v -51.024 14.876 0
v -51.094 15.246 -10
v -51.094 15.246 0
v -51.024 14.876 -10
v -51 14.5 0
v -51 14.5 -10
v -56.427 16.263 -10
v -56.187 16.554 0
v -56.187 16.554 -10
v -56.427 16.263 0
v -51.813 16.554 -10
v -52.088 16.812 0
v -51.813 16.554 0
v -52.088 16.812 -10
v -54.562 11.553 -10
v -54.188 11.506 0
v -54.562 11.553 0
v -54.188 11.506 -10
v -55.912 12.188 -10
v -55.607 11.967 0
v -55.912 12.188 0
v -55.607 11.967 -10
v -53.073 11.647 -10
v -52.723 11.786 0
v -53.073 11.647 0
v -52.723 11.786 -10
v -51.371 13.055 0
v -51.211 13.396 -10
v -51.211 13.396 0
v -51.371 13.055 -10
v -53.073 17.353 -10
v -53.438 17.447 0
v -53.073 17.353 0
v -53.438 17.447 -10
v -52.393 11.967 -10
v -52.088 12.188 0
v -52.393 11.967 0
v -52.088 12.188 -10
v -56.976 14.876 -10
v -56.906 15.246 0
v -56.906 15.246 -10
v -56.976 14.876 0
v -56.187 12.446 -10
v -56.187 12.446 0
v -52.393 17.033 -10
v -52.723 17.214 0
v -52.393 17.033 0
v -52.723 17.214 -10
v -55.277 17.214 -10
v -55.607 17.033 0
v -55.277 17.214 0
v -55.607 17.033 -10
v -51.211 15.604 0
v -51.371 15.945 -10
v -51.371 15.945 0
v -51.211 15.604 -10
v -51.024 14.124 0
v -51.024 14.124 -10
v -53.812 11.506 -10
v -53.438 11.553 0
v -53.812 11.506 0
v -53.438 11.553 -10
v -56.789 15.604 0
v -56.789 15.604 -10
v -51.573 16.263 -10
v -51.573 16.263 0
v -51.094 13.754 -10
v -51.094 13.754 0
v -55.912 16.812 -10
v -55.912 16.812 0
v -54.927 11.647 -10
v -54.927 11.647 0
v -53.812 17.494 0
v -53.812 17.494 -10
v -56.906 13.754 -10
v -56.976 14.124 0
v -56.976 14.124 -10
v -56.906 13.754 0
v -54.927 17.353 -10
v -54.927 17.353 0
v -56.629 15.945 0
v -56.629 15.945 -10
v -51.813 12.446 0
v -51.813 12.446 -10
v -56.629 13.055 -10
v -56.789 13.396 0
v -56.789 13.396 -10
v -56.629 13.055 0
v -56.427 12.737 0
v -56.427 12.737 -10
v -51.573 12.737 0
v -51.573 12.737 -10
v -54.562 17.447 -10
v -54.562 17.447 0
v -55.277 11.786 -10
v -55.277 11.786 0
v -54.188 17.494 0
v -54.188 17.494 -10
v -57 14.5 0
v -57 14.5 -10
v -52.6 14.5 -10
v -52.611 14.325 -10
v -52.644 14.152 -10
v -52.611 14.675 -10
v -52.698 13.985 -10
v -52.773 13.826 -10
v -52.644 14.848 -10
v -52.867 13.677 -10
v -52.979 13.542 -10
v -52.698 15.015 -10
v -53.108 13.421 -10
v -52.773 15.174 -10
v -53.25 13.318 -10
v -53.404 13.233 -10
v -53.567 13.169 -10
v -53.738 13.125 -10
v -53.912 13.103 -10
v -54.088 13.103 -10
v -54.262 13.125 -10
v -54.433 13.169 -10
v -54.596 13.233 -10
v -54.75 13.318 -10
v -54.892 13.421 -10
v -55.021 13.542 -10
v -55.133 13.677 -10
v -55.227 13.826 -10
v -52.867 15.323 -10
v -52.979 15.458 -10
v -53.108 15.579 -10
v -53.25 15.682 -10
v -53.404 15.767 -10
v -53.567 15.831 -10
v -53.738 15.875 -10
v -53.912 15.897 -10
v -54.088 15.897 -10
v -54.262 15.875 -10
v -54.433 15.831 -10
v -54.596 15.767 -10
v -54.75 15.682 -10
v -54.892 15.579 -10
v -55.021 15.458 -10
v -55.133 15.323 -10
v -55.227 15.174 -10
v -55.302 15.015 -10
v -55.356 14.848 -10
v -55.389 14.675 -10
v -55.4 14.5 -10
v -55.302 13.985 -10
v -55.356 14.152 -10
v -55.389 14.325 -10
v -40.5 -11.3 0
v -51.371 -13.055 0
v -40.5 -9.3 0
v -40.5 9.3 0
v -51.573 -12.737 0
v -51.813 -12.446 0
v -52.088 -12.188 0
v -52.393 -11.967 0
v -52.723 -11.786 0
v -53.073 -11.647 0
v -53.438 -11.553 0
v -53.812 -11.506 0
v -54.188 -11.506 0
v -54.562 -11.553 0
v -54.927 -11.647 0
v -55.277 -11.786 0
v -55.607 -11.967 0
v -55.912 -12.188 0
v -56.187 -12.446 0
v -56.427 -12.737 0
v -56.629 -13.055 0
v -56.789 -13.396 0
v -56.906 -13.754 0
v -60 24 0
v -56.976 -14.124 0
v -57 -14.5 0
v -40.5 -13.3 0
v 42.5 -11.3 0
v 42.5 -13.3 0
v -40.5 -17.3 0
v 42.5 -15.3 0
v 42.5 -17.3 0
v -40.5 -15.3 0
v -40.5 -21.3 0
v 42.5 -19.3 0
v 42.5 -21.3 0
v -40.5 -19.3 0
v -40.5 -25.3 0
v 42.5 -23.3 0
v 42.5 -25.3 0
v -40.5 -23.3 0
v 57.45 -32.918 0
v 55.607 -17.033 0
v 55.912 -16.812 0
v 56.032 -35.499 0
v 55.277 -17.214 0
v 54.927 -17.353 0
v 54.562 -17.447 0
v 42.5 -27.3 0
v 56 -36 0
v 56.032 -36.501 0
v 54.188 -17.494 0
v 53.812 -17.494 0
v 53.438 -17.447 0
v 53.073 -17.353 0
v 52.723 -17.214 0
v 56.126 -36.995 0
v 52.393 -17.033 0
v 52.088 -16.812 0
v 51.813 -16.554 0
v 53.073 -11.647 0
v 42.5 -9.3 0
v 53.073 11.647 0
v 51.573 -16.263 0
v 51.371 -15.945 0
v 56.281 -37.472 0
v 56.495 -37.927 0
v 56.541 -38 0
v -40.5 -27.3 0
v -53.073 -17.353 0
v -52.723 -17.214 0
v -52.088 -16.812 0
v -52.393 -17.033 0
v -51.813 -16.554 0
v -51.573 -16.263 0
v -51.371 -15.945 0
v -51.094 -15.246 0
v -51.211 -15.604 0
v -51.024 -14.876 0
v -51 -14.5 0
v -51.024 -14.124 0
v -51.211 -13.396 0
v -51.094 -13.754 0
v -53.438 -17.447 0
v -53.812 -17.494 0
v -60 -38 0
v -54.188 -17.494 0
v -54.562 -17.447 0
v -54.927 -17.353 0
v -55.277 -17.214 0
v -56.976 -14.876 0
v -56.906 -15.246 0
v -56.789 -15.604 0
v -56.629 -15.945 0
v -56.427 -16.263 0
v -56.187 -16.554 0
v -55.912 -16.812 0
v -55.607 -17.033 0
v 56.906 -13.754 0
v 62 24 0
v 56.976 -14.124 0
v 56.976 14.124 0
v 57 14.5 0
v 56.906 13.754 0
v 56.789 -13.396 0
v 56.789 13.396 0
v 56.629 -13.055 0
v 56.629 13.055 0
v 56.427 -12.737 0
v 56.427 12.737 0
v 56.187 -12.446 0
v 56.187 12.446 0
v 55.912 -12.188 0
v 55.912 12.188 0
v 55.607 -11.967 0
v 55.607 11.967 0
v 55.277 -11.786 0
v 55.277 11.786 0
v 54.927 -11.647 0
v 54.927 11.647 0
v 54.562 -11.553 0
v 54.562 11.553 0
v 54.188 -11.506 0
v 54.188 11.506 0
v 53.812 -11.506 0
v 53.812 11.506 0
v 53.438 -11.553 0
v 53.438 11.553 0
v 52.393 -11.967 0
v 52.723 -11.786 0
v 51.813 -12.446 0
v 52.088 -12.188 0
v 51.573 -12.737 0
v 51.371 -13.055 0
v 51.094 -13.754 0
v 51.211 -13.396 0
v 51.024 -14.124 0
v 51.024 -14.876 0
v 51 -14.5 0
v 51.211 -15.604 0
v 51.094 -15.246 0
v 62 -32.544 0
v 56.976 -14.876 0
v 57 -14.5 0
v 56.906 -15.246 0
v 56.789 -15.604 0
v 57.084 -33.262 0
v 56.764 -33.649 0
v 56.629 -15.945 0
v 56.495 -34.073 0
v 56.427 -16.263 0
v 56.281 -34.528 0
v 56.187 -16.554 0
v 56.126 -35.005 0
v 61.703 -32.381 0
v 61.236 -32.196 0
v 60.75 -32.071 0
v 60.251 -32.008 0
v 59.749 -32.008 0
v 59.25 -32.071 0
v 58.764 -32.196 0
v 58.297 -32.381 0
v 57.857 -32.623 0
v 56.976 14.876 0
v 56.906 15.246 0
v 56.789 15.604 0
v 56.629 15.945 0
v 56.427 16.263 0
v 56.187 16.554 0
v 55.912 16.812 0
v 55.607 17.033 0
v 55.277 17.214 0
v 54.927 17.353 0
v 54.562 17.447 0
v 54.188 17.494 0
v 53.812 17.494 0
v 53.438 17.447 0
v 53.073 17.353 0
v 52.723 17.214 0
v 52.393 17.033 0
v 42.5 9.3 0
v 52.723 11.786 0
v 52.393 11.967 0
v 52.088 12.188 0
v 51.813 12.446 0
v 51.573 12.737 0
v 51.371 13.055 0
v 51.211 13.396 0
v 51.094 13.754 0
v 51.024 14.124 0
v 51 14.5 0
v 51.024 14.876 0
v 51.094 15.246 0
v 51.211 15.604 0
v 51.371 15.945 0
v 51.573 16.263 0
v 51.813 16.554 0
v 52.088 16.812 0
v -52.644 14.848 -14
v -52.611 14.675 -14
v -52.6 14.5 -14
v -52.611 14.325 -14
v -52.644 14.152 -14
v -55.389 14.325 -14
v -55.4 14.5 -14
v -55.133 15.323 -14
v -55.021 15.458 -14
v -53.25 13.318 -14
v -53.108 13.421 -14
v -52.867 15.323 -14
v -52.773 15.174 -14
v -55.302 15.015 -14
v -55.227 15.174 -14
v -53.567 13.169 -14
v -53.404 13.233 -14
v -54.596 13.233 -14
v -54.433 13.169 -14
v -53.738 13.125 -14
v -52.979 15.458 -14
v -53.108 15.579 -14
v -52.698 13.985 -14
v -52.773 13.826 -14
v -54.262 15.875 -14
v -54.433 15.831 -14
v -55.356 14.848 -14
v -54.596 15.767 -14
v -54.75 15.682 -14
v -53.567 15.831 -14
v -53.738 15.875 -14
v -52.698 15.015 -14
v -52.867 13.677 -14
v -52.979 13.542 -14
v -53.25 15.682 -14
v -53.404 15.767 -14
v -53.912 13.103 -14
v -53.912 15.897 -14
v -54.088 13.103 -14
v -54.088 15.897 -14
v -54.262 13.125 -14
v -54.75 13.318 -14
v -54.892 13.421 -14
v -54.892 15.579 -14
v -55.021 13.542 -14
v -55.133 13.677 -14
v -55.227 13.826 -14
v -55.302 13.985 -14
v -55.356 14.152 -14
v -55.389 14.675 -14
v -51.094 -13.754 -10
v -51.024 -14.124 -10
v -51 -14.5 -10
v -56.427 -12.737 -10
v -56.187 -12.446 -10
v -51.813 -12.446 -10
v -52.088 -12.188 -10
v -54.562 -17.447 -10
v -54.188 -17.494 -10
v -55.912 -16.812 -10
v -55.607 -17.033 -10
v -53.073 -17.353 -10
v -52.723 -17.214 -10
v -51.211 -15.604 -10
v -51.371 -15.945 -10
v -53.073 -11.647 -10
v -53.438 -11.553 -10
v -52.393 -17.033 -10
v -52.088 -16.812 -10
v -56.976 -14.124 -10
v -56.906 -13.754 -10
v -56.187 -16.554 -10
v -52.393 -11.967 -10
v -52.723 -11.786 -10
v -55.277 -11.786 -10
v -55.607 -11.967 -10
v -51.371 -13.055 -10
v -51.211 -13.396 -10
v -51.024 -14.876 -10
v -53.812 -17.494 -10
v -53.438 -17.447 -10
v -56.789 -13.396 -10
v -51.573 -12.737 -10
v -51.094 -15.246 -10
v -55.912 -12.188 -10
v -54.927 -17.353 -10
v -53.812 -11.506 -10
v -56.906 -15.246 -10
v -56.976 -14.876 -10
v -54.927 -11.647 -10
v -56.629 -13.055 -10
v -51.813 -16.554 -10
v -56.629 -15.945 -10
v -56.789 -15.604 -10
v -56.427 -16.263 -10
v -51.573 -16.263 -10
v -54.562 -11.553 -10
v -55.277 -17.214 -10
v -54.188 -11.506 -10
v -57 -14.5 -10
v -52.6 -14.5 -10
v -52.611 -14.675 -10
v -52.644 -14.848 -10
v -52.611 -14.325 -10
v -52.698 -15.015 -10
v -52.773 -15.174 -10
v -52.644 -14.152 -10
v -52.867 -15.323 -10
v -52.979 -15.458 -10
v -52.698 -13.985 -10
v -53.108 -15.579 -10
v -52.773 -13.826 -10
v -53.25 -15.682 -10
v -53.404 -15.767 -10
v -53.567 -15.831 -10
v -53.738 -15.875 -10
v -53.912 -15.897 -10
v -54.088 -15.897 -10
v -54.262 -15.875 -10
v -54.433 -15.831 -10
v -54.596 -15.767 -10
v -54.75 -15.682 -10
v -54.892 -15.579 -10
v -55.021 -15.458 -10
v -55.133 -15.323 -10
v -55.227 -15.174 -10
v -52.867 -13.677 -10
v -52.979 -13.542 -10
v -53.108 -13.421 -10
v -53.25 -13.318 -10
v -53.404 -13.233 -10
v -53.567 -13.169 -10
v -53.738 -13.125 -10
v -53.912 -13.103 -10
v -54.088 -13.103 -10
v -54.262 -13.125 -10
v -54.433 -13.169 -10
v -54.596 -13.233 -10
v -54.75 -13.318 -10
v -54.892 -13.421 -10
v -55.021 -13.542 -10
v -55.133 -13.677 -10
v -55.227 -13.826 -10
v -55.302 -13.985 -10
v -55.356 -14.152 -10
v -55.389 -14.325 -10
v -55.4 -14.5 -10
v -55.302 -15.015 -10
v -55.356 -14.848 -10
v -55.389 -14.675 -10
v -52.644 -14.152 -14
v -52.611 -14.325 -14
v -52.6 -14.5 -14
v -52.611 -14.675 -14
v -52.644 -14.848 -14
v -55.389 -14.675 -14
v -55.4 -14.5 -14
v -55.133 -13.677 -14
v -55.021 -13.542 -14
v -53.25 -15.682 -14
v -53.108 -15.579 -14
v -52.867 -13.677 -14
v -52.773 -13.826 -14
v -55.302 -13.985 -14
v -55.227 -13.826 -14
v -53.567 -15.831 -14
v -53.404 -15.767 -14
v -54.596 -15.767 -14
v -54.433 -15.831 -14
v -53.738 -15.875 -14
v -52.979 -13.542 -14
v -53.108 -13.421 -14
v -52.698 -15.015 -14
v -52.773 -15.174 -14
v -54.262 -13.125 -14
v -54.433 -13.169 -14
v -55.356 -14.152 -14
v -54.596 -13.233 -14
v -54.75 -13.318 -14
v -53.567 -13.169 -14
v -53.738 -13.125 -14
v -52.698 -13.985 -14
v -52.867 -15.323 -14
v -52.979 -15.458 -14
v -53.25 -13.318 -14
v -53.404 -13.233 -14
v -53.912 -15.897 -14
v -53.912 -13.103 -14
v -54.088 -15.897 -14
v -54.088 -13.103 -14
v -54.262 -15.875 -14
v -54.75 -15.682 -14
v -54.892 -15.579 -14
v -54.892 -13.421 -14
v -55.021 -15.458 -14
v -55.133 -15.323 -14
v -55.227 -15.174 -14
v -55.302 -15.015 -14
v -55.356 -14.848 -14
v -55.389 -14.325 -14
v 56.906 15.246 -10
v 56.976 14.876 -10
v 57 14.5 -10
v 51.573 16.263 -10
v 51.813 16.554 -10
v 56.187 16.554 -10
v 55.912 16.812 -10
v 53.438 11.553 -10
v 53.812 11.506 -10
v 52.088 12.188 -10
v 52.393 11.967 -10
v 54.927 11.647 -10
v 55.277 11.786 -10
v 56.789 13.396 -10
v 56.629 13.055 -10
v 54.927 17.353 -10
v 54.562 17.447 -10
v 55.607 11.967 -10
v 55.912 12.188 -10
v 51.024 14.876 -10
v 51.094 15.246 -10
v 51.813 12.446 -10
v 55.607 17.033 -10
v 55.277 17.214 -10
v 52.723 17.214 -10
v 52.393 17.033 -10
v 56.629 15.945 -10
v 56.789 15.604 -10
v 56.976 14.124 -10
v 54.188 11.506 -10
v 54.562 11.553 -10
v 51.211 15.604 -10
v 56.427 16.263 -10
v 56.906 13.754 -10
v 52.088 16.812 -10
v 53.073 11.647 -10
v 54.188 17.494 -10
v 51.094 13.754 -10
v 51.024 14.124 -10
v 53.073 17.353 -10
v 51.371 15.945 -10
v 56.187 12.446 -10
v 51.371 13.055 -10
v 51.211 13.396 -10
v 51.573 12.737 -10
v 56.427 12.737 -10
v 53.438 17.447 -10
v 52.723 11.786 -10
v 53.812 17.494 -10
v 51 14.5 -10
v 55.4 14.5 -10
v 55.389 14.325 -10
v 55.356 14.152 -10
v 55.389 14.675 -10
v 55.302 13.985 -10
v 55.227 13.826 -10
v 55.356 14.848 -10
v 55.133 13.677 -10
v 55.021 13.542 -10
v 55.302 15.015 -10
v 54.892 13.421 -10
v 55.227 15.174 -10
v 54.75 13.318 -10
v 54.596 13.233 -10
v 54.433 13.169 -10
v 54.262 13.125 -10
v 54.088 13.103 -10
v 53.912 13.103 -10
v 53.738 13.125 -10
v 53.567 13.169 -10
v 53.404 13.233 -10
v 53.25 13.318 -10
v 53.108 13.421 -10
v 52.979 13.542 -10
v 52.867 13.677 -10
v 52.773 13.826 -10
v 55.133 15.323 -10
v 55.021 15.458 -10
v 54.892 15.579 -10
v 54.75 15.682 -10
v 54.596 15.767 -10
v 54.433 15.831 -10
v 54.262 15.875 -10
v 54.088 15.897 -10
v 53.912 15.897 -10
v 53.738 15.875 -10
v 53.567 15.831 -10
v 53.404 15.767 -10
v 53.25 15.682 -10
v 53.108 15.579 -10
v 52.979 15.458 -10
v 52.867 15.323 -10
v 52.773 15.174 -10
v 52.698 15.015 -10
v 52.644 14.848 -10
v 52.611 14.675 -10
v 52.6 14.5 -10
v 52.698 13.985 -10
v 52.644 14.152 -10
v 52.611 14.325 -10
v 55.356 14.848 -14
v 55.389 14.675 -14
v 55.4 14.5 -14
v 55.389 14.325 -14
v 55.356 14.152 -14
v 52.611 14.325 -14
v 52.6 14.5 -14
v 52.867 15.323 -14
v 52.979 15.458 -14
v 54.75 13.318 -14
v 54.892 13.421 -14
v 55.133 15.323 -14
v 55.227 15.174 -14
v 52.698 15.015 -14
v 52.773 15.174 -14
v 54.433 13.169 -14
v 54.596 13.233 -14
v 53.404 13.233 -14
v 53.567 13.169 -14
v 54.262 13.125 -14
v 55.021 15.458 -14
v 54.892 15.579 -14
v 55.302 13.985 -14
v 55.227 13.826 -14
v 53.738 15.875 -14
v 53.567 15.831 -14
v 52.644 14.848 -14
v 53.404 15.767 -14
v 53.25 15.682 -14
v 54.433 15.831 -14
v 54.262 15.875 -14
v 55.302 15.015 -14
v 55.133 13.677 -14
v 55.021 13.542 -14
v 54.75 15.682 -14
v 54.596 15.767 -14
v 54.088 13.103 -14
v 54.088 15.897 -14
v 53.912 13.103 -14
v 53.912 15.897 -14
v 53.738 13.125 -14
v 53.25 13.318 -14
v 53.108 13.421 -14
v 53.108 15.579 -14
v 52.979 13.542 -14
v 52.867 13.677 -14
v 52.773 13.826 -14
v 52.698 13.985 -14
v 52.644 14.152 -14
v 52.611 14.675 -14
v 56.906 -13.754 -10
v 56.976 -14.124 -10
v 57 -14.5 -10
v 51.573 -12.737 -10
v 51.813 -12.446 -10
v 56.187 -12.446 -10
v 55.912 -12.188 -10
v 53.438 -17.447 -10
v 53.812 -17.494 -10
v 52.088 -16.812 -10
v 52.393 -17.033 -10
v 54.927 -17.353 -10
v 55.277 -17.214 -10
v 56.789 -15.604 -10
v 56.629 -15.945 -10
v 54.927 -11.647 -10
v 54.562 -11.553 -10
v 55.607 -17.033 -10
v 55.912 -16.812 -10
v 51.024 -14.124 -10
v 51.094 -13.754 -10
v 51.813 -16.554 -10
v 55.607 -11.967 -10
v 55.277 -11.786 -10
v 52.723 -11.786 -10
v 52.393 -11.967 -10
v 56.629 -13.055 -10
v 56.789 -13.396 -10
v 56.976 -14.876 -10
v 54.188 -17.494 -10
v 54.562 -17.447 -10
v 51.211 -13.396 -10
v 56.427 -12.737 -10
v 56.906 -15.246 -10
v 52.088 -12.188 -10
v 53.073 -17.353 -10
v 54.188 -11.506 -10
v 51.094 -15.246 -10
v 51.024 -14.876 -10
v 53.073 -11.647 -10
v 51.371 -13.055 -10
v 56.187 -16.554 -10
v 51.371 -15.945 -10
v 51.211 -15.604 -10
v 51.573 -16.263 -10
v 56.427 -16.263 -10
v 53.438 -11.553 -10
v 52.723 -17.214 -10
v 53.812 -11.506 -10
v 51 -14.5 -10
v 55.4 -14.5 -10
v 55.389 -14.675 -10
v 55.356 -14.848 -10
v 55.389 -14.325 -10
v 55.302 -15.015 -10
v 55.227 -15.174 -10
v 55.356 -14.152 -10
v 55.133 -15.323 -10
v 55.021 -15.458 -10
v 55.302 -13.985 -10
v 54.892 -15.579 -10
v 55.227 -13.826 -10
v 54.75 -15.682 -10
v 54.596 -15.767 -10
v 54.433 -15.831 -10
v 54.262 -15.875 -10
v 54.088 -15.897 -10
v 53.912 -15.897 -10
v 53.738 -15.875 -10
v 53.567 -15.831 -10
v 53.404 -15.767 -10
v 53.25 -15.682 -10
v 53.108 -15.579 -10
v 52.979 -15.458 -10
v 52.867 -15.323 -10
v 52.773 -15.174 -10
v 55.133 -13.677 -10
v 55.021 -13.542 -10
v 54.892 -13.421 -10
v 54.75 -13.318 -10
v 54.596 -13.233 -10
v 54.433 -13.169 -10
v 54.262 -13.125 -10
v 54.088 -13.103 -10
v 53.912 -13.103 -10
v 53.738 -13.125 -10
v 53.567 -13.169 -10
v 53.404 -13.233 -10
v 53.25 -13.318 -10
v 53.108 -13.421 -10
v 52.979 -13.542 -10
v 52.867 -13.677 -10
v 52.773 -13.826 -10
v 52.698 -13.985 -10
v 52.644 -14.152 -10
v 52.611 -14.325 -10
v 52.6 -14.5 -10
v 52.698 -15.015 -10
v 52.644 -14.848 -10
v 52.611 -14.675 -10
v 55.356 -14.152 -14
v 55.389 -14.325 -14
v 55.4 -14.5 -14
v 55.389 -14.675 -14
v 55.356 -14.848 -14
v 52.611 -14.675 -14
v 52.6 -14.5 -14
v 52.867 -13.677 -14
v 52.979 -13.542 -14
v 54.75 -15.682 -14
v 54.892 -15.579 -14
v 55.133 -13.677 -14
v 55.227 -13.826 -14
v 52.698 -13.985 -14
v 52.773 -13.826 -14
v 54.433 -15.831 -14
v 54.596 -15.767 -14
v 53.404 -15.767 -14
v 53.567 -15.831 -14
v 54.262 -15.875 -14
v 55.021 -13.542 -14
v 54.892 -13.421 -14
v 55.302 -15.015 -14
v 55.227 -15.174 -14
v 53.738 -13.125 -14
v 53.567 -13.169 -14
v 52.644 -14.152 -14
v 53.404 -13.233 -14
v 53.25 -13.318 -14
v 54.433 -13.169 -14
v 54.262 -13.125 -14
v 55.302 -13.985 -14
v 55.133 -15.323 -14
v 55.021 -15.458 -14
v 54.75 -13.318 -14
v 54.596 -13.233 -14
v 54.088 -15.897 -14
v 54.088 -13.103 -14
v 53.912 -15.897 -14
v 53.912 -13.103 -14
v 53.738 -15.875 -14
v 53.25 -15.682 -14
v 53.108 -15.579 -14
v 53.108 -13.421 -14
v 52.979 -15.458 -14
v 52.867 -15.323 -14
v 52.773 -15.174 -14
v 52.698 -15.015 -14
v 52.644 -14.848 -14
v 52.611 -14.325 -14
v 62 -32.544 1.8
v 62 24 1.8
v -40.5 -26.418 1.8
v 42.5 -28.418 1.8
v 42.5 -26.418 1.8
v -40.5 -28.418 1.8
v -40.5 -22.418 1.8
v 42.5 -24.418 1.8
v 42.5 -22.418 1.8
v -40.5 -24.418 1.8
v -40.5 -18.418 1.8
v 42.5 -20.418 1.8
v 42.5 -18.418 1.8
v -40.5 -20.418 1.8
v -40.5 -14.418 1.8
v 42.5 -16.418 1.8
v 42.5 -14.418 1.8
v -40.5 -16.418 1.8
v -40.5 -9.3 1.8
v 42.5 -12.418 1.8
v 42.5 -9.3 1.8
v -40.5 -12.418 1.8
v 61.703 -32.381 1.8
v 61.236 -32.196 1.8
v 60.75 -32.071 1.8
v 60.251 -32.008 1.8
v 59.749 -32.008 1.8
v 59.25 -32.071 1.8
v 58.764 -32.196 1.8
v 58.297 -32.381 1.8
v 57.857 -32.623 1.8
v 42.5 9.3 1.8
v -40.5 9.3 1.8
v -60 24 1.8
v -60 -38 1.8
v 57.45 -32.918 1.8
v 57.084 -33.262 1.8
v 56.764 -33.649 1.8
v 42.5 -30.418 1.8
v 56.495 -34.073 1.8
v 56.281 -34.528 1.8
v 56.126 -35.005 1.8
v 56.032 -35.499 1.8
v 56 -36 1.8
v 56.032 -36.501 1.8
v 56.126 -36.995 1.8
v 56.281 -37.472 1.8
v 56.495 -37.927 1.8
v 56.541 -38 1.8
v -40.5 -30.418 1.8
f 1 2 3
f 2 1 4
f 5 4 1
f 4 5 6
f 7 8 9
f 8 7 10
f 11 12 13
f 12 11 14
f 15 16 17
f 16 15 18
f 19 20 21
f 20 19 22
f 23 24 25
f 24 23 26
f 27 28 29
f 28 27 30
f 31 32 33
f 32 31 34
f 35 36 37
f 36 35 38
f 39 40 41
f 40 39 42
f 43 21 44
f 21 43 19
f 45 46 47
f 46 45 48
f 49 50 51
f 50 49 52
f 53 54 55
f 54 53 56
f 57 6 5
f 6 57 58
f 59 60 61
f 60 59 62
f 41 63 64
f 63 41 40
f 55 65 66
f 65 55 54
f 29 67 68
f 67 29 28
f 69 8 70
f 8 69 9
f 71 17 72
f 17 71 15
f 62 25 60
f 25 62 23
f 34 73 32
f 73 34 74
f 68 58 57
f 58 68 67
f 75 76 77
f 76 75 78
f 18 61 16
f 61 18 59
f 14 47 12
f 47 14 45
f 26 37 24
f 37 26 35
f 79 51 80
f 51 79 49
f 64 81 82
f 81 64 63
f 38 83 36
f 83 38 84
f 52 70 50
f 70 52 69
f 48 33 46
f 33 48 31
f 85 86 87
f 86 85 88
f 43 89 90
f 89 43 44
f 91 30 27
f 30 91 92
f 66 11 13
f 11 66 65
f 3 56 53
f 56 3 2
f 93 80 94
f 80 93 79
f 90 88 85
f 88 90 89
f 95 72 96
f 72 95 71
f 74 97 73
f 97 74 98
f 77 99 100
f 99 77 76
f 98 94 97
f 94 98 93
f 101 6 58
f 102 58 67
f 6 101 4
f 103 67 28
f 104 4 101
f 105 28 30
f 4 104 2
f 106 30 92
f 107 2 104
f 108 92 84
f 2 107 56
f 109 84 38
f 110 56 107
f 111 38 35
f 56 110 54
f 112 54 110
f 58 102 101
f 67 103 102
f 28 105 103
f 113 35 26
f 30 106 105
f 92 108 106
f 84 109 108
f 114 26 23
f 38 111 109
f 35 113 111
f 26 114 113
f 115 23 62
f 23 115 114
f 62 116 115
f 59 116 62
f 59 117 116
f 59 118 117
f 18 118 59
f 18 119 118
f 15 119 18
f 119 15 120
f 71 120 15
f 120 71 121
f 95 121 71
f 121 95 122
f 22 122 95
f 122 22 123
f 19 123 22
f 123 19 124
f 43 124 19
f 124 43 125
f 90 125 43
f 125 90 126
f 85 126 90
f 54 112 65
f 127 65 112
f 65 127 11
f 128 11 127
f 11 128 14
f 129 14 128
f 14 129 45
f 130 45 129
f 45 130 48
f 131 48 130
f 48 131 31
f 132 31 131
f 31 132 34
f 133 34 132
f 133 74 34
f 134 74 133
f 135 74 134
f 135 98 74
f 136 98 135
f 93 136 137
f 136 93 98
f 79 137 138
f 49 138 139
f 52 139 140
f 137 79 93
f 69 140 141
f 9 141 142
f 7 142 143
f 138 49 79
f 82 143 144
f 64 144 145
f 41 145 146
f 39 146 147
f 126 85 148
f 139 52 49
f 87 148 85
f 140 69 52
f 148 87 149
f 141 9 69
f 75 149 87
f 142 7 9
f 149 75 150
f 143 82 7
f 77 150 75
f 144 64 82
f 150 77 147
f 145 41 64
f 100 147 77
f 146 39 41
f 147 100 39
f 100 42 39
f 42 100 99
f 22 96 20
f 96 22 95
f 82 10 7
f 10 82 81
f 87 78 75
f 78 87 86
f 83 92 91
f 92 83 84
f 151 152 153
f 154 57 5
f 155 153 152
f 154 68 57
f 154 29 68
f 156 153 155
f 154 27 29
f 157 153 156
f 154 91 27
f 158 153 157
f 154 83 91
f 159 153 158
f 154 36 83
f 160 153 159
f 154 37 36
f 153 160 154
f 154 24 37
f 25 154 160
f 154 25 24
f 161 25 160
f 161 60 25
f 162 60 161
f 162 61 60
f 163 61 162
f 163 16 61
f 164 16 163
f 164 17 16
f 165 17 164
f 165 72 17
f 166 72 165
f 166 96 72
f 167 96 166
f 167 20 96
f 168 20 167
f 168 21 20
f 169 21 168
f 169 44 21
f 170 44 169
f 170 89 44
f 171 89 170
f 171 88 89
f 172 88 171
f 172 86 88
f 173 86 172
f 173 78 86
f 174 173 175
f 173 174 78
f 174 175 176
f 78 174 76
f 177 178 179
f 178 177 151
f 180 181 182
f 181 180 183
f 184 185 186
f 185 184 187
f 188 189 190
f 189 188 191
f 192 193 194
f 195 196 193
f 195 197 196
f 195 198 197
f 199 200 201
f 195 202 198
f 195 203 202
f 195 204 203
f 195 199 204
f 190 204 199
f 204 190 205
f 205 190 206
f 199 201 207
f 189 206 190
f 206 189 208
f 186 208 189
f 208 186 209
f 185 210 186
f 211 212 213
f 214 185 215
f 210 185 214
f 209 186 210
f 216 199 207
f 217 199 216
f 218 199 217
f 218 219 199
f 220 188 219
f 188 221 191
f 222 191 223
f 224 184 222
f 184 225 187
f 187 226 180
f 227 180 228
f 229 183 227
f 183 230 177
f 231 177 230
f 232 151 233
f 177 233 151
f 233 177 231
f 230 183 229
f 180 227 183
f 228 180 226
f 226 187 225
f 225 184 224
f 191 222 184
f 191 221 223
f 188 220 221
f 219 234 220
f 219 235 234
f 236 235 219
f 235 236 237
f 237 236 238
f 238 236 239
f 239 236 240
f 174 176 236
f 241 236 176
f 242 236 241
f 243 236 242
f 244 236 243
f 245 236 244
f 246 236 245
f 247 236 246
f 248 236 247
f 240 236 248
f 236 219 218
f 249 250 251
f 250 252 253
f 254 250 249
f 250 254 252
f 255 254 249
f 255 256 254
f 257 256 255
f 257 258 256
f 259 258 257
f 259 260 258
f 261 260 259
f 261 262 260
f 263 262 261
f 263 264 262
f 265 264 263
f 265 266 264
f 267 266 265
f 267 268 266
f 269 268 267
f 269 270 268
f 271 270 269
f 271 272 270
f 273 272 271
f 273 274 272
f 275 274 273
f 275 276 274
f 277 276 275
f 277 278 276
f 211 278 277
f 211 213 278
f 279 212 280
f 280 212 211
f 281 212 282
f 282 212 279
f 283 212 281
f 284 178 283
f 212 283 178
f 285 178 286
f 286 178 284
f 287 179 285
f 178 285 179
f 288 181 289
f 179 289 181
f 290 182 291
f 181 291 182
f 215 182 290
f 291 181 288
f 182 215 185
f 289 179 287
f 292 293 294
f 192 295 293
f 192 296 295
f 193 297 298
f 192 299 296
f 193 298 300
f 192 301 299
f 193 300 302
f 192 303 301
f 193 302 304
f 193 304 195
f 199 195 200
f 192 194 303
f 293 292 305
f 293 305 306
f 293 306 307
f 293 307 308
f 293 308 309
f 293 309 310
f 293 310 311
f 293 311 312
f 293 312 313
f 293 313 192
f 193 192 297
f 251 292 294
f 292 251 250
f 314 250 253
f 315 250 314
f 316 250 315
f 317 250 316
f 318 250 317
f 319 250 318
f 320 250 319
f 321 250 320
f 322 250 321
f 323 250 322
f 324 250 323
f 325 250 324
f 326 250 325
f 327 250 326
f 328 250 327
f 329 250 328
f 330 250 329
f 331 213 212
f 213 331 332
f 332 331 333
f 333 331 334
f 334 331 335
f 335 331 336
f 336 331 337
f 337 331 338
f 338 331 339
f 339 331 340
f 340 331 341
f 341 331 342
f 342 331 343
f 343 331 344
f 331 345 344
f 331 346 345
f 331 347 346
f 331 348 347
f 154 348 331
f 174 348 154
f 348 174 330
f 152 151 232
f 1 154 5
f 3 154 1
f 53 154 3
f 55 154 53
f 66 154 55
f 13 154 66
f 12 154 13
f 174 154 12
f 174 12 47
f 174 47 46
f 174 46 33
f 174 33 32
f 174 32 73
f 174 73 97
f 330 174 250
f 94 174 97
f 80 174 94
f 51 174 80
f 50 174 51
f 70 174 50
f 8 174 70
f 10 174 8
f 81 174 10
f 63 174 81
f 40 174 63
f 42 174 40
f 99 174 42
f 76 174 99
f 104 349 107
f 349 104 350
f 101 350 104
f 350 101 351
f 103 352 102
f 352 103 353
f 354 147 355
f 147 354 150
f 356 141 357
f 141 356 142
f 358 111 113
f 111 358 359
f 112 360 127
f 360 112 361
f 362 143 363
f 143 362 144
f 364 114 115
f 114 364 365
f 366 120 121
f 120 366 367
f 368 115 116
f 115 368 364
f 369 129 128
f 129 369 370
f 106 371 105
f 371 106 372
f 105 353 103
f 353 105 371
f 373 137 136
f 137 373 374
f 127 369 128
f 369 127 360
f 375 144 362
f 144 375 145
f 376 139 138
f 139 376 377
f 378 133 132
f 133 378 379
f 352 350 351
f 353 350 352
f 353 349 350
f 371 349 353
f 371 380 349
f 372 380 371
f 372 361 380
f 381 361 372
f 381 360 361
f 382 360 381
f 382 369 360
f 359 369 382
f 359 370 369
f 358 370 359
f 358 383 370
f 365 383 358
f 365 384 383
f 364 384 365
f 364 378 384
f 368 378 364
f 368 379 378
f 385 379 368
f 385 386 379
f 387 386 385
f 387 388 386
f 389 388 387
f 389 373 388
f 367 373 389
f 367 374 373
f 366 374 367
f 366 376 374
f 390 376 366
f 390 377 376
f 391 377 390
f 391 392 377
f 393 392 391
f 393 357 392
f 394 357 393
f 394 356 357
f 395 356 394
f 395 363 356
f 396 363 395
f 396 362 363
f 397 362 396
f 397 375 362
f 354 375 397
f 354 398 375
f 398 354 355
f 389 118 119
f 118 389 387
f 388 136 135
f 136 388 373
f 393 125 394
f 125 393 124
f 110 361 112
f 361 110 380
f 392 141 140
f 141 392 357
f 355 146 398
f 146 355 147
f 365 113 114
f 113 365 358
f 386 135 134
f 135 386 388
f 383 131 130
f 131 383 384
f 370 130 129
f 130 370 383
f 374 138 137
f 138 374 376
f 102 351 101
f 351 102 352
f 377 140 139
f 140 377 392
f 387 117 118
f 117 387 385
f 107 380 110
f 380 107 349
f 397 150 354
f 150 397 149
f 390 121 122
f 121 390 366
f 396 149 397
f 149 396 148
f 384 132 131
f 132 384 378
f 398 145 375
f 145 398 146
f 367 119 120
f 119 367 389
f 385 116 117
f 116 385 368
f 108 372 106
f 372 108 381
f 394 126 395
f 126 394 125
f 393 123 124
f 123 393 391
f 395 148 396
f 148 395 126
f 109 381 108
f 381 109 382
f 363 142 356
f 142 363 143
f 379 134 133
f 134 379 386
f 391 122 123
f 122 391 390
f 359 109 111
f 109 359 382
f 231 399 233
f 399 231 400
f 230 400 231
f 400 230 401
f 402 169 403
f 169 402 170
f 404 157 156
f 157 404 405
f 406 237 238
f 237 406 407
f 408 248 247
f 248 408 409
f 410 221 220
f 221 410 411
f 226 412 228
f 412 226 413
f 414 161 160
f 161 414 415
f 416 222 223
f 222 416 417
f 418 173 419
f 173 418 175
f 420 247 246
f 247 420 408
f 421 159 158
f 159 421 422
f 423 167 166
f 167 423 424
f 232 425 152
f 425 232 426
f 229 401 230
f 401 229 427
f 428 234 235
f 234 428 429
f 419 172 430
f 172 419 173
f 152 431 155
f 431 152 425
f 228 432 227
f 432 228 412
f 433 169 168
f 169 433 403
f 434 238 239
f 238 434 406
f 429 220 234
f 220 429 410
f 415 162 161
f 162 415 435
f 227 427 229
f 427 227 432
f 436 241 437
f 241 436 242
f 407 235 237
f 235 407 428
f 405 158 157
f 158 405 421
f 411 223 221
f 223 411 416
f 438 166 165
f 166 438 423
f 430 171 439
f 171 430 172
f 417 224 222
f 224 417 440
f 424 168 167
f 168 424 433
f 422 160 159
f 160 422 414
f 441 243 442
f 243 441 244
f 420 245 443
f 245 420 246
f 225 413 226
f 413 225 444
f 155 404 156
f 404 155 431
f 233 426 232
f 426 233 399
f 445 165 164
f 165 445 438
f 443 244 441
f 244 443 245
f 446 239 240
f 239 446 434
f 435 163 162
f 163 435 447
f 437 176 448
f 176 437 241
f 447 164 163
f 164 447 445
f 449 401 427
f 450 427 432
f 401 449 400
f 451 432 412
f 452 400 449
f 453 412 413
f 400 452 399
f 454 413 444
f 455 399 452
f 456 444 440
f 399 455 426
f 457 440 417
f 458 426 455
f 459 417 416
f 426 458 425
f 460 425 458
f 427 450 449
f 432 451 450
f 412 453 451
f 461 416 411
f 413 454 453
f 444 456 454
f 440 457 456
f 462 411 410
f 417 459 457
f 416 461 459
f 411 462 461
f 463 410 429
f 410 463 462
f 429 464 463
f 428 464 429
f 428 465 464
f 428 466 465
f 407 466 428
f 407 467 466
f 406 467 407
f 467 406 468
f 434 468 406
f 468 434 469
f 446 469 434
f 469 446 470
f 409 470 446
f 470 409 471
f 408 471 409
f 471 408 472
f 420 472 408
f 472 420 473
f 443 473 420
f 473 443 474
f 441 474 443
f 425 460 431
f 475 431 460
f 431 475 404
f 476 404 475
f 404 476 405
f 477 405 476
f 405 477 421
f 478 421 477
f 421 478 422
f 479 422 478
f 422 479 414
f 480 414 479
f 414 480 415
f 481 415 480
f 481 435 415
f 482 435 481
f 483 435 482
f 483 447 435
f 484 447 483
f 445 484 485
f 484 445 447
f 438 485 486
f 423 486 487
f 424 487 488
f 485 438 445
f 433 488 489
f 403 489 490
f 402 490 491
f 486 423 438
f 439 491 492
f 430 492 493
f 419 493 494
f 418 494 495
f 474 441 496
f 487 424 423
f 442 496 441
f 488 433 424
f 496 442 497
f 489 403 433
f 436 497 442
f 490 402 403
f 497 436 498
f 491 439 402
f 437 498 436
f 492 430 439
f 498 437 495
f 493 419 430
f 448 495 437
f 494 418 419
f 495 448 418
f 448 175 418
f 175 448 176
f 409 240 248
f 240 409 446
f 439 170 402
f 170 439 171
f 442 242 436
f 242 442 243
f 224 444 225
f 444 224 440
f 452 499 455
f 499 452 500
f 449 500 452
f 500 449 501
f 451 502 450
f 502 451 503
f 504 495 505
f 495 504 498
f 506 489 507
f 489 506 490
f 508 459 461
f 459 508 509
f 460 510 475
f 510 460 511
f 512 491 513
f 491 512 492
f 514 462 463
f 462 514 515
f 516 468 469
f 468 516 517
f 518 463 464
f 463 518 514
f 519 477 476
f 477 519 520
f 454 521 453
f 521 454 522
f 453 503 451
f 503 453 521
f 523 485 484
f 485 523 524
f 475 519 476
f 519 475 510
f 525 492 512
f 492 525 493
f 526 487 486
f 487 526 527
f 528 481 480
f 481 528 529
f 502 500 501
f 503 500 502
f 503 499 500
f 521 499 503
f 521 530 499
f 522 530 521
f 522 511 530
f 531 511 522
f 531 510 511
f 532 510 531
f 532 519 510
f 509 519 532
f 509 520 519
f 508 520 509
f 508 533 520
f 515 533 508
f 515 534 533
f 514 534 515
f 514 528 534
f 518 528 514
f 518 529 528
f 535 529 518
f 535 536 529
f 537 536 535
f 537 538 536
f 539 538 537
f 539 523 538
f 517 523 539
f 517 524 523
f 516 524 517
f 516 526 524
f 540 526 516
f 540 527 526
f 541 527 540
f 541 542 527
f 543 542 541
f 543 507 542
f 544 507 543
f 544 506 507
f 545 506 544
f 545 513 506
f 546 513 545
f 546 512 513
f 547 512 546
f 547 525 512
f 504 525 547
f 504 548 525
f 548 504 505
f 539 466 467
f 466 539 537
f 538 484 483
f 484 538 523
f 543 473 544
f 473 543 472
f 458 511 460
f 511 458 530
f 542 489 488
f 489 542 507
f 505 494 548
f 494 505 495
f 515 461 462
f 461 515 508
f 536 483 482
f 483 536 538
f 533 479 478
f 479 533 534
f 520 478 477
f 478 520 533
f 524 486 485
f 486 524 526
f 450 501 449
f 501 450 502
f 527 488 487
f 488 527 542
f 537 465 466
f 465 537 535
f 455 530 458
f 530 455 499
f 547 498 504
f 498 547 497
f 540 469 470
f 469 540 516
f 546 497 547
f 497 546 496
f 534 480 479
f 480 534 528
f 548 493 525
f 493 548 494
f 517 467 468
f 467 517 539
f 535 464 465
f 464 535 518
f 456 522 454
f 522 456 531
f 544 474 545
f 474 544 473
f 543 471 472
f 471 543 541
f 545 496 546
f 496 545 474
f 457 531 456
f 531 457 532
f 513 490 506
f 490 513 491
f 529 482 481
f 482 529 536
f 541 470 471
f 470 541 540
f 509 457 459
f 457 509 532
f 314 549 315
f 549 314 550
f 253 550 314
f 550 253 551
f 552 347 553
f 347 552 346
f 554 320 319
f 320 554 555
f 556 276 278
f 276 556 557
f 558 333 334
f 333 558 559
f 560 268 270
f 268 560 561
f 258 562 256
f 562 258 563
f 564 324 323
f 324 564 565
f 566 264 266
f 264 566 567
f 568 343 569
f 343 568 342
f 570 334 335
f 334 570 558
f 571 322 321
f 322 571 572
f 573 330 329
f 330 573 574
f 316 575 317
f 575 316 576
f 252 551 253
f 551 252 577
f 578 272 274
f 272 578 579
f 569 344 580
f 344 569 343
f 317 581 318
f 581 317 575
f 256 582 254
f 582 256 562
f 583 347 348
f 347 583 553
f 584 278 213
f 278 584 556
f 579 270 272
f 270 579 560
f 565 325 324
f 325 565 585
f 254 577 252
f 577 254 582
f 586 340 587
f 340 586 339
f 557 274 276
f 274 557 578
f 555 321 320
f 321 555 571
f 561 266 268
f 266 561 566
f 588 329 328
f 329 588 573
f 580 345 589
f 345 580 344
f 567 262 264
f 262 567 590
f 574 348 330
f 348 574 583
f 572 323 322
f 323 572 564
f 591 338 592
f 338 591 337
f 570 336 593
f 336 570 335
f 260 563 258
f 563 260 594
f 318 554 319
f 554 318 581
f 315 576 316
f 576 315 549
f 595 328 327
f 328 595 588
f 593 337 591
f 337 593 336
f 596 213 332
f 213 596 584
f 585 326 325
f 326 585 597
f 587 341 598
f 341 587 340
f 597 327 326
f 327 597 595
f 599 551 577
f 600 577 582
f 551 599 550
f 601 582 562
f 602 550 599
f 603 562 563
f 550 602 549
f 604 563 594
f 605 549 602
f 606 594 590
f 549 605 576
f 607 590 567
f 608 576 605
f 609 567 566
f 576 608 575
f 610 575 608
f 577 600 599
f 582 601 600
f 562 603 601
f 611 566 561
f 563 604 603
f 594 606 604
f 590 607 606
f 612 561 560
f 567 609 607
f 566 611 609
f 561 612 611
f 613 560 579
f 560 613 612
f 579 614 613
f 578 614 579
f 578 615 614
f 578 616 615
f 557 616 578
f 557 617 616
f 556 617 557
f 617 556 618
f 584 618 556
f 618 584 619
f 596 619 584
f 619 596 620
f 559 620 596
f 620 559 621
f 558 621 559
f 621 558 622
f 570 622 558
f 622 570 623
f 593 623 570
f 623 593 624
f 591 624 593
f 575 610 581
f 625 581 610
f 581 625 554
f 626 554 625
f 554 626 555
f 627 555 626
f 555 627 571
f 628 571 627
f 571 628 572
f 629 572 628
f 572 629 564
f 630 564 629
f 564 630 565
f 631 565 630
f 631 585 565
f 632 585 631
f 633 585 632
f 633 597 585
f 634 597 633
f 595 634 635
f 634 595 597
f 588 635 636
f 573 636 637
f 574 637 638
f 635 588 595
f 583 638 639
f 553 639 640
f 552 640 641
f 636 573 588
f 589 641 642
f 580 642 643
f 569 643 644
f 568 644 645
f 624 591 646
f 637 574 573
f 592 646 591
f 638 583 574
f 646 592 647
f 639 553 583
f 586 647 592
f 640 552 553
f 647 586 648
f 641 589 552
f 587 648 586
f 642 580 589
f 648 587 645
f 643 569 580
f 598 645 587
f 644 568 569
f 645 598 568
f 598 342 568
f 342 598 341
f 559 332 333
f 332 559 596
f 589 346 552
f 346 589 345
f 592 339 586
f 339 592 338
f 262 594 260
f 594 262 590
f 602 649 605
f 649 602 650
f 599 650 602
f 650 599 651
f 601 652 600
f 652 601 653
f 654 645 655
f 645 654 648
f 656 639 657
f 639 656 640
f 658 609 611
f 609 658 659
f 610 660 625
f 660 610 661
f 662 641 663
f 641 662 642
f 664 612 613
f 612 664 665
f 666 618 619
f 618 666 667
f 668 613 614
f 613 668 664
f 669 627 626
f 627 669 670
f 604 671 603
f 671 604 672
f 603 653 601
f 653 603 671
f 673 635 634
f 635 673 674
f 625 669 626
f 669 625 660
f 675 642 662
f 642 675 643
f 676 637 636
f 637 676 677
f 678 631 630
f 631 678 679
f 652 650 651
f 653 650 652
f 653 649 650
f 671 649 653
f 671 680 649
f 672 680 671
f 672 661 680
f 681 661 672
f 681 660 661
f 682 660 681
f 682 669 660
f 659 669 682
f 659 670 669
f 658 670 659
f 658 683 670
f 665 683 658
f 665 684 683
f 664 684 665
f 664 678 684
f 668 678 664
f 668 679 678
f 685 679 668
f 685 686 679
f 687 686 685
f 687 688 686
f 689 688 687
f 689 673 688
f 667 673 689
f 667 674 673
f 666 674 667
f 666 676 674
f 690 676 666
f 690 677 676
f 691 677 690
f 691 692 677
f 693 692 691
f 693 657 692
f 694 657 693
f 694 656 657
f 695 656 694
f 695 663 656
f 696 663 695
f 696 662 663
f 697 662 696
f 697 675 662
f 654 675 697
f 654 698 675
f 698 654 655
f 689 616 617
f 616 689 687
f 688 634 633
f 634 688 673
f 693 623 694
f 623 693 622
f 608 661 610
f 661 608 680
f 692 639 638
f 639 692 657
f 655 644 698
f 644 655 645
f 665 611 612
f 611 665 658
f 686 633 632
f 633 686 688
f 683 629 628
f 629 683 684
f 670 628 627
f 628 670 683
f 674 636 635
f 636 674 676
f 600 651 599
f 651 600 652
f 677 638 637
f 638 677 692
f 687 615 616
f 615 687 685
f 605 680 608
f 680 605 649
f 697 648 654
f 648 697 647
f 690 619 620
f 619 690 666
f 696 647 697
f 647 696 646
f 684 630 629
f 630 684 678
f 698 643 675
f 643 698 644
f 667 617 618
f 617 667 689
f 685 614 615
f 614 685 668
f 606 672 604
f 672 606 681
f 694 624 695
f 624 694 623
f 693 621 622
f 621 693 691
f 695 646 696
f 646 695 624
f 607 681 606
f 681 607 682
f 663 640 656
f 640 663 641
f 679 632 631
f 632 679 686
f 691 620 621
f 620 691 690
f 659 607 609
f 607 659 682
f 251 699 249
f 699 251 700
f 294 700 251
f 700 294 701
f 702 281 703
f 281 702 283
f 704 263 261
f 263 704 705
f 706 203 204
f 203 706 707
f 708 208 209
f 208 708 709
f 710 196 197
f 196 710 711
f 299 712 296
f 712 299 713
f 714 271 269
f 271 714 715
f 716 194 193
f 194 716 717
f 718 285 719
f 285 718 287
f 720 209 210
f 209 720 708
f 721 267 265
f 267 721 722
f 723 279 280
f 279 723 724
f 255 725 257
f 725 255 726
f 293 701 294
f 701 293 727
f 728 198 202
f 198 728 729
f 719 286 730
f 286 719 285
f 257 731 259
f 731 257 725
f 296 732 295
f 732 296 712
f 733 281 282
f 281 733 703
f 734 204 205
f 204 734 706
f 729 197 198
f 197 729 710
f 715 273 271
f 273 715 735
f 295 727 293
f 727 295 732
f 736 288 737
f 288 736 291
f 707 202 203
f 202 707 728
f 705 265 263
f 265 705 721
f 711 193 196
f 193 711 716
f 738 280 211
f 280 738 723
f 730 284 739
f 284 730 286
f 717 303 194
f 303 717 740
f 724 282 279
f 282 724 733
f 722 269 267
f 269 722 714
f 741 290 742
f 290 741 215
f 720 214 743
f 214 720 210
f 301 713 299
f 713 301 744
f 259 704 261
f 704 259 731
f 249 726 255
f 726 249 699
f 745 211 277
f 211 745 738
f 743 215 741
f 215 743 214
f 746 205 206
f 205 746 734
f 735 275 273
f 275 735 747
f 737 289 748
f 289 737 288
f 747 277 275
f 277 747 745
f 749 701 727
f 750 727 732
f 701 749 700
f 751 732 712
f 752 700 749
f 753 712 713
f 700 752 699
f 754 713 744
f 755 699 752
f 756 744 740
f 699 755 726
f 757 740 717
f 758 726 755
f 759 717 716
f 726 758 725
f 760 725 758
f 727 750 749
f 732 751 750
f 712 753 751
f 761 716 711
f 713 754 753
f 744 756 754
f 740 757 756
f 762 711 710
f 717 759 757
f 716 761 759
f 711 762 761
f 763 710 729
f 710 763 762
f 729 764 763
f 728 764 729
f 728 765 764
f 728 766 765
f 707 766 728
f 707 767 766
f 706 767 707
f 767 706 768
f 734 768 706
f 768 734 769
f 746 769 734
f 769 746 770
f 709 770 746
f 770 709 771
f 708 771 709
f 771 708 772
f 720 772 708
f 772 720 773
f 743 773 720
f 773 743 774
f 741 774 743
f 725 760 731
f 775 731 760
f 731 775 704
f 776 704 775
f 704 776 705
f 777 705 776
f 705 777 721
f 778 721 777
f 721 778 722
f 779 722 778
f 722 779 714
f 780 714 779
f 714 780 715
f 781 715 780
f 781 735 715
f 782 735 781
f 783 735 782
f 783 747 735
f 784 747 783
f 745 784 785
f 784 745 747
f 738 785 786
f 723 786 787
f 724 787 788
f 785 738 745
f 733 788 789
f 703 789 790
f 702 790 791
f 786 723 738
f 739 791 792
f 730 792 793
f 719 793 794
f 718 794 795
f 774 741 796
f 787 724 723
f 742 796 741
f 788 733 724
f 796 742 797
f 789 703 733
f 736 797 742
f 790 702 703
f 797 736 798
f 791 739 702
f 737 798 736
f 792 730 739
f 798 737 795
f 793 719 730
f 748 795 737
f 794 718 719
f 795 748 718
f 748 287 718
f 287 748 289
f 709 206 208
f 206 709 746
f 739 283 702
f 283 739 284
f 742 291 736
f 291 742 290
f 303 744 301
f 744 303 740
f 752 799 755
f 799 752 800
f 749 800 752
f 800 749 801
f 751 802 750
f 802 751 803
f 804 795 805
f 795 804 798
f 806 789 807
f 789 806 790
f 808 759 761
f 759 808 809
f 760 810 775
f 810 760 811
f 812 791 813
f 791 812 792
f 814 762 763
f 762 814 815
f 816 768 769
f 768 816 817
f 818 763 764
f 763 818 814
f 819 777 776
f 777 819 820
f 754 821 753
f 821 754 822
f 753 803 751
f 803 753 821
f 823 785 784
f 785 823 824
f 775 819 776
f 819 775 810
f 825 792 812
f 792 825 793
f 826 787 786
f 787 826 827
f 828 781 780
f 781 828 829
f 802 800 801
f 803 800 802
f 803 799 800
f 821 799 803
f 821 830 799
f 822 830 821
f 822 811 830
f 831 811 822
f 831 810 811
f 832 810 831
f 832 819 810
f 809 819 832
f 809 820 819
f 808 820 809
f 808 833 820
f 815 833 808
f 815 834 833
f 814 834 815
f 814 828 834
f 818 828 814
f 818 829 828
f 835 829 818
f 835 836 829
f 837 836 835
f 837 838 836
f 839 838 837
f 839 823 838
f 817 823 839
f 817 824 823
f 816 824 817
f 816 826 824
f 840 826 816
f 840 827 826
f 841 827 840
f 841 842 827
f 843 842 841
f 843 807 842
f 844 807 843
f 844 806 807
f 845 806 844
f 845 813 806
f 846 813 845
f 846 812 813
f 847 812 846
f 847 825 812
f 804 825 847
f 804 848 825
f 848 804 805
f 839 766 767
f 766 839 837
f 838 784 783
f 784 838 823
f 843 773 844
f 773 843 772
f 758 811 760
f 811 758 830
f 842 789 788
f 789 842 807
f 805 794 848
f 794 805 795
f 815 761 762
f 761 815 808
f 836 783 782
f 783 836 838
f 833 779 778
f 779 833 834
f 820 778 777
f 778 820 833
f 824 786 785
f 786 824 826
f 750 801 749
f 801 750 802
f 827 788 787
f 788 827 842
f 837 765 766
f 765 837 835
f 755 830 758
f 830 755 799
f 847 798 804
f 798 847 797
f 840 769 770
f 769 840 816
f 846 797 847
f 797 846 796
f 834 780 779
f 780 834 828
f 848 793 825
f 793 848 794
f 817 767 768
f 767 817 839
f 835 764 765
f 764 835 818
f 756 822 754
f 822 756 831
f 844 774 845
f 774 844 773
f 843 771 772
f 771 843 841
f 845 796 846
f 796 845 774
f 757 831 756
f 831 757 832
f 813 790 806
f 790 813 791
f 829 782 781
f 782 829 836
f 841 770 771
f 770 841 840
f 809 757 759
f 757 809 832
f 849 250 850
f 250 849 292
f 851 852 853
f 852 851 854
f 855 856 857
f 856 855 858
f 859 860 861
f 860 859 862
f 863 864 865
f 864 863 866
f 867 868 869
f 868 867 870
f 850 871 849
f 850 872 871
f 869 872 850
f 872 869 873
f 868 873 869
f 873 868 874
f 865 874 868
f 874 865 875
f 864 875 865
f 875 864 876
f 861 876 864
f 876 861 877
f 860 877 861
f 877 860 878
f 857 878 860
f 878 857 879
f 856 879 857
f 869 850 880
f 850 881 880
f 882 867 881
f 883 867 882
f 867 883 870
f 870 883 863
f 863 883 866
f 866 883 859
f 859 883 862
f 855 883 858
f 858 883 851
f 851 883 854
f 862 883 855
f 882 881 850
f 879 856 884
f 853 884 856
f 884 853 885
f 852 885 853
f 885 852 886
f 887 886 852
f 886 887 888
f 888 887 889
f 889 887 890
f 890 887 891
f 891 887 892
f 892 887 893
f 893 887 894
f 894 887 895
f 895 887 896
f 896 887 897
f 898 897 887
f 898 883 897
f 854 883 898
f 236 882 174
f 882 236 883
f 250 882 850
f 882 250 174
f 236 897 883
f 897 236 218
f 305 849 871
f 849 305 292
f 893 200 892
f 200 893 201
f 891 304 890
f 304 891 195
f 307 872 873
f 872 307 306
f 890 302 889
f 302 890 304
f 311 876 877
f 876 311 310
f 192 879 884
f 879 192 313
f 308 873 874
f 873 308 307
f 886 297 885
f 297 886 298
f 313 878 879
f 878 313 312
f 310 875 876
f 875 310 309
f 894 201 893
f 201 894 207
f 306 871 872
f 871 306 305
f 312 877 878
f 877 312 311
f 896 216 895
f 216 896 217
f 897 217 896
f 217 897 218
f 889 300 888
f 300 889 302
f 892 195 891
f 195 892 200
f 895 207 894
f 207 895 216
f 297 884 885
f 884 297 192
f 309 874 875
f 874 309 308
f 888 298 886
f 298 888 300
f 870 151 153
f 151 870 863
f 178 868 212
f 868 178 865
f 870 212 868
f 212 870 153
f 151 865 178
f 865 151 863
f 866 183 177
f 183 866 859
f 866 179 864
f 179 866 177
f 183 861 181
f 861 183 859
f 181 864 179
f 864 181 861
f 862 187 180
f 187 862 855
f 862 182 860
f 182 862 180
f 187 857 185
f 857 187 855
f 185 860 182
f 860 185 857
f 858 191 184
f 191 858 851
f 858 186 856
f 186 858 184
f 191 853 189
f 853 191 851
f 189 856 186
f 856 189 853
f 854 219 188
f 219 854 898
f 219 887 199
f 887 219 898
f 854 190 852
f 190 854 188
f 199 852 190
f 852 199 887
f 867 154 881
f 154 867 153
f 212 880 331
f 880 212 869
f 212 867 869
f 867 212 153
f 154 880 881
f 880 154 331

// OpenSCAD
/* [Stands] */
stand_x_dist = 108;
stand_y_dist = 29;
stand_height = 10;
stand_outer_diameter = 6;
stand_inner_diameter = 3;
/* [Window] */
cutout_x = 13.5;
cutout_y = 5.2;
cutout_width = 83;
cutout_height = 18.6;
/* [Front] */
front_width = 122;
front_height = 62;
front_thickness = 1.8;
// The depth of groove of the case in which the front rests
front_case_inset = 2;
cable_diameter = 4;
//Position of display wrt center
display_x_correction = -1;
//Position of display wrt center
display_y_correction = 7;
air_vent_width = cutout_width;
air_vent_height = 1;
air_vent_dist = 3;
air_vent_y = 6;
/* [PCB] */
pcb_thickness = 2;
/* [Misc] */
nozzle_diamater = 0.4; //[0.4, 0.6]
$fn=50;

module stand() {
    cylinder(d=stand_outer_diameter, h=stand_height);
    translate([0,0,2*-pcb_thickness])
        cylinder(d=stand_inner_diameter-nozzle_diamater/2, h=2*pcb_thickness);
}

module stands() {
    //center
    translate([-stand_x_dist/2, stand_y_dist/2, -stand_height])
    for(x=[0,stand_x_dist], y=[0,-stand_y_dist]) {
        translate([x, y, 0]) stand();
    }
}

module window_cutout() {
    //center
    translate([-stand_x_dist/2, stand_y_dist/2, -stand_height])
    //move window to proper position
    translate([cutout_x, -cutout_height-cutout_y, 0])
        // Hull to 'grow' cutout a bit for margin.
        hull() {
            // 'window'
            cube([cutout_width, cutout_height, stand_height + front_thickness + 1]);
            cube([nozzle_diamater/2,nozzle_diamater/2, nozzle_diamater/2]);
        }
}

module air_vents() {
    //center
    translate([-stand_x_dist/2, stand_y_dist/2-air_vent_y, -stand_height])
    //move window to proper position
    translate([cutout_x, -cutout_height-cutout_y, 0])
    translate([(cutout_width-air_vent_width)/2, 4, 0])
    for (i = [0:4]) {
        translate([0, -(air_vent_dist + air_vent_height)*i, stand_height])
            //slanted to prevent light leakage.
            rotate([60,0,0])
            translate([0, 0, -10/2])
            cube([air_vent_width, air_vent_height, 10]);
    }
}

module frontplate() {
    translate([-front_width/2, -front_height/2, 0]) {
        difference() {
            cube([front_width, front_height, front_thickness]);
            // compensate for case inset
            translate([-front_case_inset, front_case_inset, 0])
            //move to lower right corner
            translate([front_width, 0, -front_thickness])
                // Since the cutout for the cable is from the corner
                // the RADIUS of the cutout == DIAMETER of the cable
                cylinder(r=cable_diameter, h=front_thickness*10);
        }
    }
}

union() {
    stands();
    difference() {
        translate([-display_x_correction, -display_y_correction, 0])
            frontplate();
        window_cutout();
        air_vents();
    }
}
